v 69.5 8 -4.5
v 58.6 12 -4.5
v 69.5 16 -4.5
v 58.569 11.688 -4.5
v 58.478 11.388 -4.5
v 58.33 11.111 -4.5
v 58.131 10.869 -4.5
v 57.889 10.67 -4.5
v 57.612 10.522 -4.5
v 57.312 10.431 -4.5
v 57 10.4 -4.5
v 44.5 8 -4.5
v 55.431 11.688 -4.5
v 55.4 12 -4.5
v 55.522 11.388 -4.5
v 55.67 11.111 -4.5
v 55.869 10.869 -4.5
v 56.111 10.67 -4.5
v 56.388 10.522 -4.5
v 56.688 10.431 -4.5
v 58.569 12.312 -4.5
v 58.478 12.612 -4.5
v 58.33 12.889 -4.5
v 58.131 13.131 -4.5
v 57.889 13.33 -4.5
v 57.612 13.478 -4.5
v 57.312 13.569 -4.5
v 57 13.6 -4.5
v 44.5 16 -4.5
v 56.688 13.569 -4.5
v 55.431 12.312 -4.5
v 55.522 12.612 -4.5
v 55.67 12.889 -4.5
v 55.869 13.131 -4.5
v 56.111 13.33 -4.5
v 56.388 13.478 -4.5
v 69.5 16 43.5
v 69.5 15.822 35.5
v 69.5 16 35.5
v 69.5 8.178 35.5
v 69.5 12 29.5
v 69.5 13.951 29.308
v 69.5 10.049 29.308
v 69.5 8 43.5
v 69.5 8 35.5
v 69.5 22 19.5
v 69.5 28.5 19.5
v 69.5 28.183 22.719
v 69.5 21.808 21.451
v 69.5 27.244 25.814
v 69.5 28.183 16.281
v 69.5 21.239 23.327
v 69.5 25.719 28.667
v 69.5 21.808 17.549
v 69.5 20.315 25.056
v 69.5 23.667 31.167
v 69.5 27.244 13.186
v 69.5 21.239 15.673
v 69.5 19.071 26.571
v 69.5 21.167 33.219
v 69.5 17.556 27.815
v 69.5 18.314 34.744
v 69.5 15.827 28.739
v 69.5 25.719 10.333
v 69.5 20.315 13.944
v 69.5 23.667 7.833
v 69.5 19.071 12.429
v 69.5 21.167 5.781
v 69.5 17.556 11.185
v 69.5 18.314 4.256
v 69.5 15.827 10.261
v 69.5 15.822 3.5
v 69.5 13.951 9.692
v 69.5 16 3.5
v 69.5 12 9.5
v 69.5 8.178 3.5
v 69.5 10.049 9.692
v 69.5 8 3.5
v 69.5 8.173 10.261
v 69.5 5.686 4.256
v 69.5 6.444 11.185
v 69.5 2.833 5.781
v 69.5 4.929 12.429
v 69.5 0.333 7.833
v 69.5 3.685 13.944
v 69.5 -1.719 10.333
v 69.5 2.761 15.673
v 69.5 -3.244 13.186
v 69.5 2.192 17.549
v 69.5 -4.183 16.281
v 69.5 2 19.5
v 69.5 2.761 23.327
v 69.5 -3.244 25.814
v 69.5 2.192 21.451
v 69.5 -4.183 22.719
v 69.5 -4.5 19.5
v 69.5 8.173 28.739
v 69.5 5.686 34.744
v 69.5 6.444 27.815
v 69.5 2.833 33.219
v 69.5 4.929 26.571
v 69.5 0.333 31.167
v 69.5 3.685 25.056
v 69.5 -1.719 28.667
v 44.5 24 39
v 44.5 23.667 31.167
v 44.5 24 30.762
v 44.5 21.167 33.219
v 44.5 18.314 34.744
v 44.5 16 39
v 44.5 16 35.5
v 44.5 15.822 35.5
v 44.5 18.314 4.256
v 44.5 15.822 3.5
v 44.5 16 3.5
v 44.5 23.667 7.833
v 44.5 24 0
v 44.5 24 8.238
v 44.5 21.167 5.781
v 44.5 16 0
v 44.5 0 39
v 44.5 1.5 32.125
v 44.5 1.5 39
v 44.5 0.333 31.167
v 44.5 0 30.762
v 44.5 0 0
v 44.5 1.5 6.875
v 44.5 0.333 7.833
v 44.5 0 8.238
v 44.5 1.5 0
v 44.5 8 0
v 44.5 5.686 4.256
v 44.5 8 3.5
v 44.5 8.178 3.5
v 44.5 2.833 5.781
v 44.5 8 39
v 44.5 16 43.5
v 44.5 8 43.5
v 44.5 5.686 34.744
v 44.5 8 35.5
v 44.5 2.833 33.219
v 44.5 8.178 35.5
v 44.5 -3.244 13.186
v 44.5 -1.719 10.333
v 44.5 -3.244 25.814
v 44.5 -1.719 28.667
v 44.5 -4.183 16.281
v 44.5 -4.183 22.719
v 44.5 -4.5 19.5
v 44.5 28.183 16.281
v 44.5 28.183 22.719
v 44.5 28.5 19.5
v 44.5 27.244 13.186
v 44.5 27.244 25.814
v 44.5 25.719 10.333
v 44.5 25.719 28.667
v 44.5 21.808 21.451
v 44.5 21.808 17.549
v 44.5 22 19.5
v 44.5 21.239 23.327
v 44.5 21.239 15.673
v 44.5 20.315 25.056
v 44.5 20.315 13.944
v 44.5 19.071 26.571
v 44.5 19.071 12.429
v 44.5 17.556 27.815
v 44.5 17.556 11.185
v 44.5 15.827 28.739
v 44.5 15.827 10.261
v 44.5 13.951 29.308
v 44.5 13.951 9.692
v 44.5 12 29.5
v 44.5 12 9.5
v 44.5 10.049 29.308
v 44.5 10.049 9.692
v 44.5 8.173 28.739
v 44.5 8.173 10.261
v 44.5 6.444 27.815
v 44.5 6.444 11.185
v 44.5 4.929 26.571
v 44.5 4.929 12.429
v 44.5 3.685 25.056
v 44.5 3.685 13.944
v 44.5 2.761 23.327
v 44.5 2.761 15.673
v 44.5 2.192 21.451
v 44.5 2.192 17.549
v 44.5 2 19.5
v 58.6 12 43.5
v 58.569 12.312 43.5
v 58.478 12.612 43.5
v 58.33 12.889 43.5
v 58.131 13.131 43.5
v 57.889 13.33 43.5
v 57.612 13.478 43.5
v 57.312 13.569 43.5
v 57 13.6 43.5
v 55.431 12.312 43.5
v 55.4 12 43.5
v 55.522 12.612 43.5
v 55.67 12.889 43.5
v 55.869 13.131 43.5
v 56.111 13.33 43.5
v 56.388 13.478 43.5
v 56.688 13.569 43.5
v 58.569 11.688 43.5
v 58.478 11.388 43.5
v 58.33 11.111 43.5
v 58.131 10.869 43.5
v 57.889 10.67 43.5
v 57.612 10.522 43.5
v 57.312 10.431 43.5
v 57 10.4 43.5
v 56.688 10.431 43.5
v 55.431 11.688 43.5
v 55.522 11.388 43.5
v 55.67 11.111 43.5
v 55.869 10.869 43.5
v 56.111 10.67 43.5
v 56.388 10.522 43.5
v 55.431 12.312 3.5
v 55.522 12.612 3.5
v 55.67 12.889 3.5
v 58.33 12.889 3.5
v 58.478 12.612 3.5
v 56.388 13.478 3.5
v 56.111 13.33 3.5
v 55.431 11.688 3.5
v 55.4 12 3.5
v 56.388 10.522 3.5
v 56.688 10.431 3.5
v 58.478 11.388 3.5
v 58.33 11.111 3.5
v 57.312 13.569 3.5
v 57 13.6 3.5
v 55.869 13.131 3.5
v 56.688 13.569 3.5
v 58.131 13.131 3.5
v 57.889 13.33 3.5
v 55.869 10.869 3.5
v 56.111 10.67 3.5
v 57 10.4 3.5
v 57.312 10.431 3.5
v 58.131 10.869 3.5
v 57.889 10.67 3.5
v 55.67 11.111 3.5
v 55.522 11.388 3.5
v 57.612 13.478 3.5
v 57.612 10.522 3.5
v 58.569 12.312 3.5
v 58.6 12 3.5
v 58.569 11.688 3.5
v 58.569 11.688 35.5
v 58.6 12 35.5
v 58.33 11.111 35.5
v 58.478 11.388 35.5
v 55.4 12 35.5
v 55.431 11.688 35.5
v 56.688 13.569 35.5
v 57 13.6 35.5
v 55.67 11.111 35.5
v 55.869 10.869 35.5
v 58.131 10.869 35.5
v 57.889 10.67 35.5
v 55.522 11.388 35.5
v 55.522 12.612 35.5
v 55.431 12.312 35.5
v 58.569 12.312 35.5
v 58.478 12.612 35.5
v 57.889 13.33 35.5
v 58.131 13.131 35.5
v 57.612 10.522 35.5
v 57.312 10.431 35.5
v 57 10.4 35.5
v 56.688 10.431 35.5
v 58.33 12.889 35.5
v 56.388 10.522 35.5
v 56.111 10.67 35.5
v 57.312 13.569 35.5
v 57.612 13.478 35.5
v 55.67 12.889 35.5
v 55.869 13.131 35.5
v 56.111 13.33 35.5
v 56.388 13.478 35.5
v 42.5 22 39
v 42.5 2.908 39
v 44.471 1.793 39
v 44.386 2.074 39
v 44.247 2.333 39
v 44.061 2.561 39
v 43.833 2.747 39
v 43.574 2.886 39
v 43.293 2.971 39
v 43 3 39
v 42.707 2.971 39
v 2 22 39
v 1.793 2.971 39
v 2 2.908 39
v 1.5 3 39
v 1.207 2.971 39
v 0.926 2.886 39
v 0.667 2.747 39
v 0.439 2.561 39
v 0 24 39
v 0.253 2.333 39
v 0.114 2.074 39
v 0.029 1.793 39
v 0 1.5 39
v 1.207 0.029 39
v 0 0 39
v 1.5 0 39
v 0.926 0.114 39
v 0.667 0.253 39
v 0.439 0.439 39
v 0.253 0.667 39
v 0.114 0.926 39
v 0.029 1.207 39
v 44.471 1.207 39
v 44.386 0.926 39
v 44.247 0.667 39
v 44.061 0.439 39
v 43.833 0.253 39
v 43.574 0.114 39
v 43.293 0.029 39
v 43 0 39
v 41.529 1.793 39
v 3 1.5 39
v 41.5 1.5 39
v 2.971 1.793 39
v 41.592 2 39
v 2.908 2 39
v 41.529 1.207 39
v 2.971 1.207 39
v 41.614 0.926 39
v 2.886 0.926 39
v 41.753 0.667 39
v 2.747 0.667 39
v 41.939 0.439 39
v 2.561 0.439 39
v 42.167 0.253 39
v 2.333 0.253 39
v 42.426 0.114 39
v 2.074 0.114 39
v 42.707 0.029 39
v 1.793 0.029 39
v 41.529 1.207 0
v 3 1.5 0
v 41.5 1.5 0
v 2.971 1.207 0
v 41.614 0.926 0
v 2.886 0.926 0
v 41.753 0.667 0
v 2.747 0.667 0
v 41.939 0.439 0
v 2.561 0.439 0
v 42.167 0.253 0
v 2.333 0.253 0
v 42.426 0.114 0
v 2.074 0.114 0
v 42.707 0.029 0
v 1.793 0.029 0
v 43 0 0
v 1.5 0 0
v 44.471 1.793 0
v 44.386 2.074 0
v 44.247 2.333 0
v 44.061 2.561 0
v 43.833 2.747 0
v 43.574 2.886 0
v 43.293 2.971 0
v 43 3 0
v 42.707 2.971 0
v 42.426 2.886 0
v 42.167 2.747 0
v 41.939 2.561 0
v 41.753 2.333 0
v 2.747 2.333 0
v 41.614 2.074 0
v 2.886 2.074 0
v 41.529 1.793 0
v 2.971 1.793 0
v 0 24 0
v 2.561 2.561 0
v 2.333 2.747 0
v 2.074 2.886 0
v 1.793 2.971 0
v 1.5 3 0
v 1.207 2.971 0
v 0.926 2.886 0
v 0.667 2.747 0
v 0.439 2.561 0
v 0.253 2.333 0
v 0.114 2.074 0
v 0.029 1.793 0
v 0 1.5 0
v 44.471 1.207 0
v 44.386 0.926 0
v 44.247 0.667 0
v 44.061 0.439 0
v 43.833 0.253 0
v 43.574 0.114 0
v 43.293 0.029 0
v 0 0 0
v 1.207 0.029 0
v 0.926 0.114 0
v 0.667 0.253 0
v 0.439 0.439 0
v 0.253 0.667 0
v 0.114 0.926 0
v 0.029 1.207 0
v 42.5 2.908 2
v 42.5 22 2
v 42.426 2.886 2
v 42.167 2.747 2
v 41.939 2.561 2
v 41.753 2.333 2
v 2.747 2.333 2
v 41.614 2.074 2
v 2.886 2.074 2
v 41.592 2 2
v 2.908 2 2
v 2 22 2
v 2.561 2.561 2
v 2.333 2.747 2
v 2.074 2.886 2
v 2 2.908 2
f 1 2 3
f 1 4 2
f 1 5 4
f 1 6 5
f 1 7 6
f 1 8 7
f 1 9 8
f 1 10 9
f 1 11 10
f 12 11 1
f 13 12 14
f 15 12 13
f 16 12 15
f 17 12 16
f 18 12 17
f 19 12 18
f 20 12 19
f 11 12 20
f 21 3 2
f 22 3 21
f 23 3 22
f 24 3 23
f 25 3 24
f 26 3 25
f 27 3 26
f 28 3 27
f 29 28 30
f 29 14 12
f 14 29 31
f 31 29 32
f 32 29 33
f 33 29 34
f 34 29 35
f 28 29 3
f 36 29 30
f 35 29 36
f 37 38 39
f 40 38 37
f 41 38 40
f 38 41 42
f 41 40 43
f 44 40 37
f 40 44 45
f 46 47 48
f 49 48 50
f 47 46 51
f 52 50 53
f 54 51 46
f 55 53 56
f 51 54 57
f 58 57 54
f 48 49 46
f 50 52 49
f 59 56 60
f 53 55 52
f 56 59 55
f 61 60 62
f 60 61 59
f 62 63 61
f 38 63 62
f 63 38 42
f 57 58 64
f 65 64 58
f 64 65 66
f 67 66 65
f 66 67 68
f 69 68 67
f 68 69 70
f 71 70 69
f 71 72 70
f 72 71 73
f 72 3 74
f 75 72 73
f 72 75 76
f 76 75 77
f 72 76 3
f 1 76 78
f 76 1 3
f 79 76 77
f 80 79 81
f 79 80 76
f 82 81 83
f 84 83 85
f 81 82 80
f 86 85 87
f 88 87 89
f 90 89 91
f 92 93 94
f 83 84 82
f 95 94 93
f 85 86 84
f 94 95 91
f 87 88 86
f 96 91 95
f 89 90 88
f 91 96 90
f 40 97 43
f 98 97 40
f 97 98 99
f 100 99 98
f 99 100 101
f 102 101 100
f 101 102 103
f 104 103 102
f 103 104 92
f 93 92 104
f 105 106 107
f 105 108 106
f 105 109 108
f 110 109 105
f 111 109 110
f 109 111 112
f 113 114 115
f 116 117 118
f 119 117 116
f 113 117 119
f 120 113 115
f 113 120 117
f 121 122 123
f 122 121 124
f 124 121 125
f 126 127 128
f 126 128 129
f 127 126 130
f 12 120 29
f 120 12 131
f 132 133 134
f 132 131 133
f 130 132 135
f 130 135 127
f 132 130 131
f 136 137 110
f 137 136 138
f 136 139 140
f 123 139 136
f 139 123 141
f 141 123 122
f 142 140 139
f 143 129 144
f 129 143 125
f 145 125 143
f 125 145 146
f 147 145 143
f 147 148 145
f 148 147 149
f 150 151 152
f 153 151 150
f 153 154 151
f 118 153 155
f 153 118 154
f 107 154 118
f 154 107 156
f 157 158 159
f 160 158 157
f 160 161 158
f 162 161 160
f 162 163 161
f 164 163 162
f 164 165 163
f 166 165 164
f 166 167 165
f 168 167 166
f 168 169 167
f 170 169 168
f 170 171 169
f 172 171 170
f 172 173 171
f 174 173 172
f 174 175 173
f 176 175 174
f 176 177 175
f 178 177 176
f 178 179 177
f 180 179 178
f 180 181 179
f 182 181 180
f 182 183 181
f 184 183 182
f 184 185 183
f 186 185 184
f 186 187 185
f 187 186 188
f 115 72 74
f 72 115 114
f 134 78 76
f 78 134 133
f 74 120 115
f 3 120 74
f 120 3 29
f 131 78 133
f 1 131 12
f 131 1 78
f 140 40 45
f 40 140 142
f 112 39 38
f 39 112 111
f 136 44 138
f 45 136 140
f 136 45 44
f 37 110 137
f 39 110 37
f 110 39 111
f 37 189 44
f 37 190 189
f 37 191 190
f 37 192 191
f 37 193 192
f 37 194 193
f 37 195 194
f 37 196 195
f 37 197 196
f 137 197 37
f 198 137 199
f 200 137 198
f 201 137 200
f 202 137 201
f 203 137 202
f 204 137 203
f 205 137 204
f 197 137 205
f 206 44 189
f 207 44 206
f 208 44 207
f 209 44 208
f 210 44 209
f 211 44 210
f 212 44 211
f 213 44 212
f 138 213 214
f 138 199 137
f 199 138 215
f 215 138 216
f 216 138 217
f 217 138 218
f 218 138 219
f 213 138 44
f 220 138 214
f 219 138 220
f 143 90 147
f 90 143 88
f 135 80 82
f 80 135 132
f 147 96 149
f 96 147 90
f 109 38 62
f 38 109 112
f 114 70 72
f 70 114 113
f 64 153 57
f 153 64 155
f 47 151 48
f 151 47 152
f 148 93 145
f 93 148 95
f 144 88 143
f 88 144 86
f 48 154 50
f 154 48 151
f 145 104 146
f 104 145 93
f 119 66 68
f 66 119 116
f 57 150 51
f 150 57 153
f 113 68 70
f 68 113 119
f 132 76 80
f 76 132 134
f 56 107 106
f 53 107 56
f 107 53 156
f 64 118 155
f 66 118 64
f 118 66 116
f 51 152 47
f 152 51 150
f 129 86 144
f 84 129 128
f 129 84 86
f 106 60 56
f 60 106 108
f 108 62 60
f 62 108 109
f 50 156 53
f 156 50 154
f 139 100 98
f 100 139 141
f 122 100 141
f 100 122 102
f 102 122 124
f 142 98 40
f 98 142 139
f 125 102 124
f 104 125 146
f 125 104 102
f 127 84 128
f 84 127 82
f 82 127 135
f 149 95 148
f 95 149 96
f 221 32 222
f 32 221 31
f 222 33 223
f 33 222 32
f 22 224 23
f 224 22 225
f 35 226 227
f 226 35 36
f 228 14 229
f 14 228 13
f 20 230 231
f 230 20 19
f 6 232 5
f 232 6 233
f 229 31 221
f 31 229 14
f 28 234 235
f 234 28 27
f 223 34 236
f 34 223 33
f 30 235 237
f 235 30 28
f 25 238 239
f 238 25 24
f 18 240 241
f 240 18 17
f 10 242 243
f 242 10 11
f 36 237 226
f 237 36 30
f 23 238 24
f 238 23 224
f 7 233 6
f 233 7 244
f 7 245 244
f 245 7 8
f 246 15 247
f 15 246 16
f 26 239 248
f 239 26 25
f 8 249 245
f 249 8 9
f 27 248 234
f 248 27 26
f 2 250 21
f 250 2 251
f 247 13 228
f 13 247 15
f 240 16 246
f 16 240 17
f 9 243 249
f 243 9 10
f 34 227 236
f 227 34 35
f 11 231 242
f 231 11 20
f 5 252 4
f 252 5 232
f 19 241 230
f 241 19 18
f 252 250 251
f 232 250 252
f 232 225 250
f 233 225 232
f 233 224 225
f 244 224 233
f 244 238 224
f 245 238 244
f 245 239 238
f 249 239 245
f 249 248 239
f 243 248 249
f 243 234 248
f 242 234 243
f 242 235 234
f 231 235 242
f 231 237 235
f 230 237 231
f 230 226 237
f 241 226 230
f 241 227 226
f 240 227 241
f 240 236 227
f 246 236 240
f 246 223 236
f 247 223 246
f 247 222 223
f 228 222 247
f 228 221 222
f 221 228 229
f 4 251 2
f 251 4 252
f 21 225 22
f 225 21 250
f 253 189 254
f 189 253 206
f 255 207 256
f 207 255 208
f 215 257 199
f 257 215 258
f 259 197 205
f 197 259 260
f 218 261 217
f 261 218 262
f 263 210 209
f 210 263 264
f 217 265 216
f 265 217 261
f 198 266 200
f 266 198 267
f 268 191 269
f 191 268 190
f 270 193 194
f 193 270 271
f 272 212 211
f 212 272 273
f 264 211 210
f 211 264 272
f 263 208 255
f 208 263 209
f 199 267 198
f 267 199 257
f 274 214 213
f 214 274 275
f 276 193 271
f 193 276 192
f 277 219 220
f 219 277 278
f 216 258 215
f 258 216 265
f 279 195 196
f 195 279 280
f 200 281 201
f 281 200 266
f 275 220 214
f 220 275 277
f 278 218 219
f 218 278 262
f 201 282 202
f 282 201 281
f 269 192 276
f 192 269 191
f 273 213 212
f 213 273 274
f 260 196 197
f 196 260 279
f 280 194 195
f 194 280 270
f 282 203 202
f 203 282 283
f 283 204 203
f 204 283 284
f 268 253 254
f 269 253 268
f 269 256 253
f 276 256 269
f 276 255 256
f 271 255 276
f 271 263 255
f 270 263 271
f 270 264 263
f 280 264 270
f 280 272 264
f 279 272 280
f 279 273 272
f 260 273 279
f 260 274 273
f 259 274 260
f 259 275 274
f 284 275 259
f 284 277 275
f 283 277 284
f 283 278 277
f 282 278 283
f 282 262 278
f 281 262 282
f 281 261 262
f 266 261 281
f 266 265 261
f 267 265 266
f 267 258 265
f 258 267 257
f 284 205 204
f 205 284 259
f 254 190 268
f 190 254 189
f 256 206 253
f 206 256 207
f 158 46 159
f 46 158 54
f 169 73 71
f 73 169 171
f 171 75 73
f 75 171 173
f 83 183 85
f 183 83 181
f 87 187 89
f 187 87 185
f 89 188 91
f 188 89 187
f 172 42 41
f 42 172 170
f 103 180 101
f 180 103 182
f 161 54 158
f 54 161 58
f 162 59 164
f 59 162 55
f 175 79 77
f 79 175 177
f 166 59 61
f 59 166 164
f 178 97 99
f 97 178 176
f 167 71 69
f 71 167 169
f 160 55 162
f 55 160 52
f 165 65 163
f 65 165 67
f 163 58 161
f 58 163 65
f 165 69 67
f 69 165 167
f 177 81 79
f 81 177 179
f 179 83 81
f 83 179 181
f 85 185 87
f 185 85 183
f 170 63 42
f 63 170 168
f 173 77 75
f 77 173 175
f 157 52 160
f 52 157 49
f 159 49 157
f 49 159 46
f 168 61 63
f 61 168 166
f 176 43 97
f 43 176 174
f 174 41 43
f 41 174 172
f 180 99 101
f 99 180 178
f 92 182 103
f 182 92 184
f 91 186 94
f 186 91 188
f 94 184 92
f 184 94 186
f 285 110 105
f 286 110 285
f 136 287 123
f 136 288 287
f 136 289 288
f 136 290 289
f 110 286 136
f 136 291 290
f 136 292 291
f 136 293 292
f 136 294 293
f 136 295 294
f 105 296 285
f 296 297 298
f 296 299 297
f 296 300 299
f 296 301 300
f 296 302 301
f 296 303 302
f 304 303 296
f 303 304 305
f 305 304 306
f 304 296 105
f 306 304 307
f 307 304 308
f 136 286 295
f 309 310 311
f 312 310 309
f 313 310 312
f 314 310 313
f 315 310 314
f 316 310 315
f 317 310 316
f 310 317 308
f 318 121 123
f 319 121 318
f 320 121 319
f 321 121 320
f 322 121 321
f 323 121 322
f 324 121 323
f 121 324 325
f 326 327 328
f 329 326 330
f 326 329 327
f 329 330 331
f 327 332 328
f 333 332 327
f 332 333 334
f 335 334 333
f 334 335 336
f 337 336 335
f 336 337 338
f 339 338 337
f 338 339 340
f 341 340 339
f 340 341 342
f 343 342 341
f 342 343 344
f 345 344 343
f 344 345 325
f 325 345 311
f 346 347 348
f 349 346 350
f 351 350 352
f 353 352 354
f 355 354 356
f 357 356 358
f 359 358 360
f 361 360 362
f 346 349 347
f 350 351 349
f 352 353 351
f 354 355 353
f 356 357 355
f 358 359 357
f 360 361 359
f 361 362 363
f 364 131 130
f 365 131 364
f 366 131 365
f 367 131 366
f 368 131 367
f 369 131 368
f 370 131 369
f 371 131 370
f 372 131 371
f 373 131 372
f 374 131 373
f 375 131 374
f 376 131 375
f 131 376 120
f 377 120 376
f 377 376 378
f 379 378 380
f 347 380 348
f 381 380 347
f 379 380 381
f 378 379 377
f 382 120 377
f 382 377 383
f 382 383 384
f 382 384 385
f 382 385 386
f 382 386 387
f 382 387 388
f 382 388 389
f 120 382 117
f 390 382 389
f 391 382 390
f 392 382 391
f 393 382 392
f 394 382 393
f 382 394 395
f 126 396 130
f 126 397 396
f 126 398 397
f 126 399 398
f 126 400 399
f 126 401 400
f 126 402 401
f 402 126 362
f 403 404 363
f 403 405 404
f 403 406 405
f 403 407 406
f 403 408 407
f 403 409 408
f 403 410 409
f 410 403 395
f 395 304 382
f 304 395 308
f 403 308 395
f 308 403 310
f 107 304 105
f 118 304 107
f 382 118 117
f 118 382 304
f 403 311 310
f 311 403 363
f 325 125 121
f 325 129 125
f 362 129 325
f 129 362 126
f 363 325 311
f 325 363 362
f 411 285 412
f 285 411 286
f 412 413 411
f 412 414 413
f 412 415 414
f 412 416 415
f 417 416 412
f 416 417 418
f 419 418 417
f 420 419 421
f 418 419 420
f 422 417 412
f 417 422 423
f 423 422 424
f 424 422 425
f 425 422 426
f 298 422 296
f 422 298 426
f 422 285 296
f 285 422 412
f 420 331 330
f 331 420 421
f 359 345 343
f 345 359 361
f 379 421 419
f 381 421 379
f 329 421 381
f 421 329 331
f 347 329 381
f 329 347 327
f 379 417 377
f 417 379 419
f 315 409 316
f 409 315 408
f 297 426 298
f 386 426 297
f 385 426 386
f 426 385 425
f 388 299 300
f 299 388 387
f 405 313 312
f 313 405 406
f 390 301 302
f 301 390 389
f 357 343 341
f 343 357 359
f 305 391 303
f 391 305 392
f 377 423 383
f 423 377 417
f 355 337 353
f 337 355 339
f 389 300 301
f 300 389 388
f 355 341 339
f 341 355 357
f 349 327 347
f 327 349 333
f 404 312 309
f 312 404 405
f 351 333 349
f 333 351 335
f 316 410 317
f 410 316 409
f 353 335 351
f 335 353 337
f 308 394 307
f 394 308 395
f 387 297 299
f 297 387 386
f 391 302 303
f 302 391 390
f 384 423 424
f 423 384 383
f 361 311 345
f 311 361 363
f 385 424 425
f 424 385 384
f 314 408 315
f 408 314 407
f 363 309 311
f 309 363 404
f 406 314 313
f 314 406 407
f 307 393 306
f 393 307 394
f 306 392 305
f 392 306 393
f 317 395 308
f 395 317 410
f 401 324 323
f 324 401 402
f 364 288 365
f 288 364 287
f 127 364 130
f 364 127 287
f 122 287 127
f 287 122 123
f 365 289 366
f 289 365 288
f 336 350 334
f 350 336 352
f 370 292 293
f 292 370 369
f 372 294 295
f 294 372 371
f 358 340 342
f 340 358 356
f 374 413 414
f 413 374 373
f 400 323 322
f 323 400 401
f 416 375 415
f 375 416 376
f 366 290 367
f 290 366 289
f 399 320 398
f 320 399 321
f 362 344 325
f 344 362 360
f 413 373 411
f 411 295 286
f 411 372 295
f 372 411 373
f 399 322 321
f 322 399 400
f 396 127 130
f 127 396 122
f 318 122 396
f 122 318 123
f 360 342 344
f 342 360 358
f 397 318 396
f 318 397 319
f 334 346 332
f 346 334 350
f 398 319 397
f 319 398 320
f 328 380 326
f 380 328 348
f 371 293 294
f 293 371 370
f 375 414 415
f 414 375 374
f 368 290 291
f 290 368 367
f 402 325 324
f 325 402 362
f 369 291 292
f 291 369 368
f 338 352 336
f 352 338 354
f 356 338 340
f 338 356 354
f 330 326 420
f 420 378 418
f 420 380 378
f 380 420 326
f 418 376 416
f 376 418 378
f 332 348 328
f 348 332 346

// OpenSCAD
// ============================================================
// shoulder_joint_bracket.scad
// Shoulder Joint Bracket for Humanoid Welcoming Robot
// Servo mount interface for MG996R servo + PVC pipe adapter
//
// Print Settings:
//   Material:    PLA
//   Infill:      80%
//   Layer height: 0.2 mm
//   Supports:    None required
//   Weight:      ~20 g
//   Print time:  ~8 minutes
// ============================================================

$fn = 32;
$fa = 6;
$fs = 1;

// --- Parametric Variables ---
servo_width            = 40.5; // mm  MG996R body width
servo_depth            = 20;   // mm  MG996R body depth
servo_height           = 37;   // mm  MG996R body height
servo_flange_thickness = 2.5;  // mm  mounting flange thickness
pvc_bore               = 20;   // mm  PVC pipe inner diameter
pvc_wall               = 2.5;  // mm  PVC pipe wall thickness (OD ~25 mm)
mounting_hole_diameter = 3.2;  // mm  M3 screw holes
wall_thickness         = 2.0;  // mm  bracket wall thickness
corner_radius          = 1.5;  // mm  reinforced bearing surface radius

// Derived
pvc_od = pvc_bore + 2 * pvc_wall;            // outer diameter ~25 mm
servo_mount_length = servo_width + 2 * wall_thickness;
servo_mount_width  = servo_depth + 2 * wall_thickness;
servo_mount_height = servo_height + wall_thickness;

// Horn mounting hole positions (4-point, 8 mm from servo centre)
horn_hole_offset = 8;

// ============================================================
// Module: servo_pocket
// Recessed cavity for MG996R servo body
// ============================================================
module servo_pocket() {
    translate([wall_thickness, wall_thickness, wall_thickness])
        cube([servo_width, servo_depth, servo_height + 1]);
}

// ============================================================
// Module: servo_horn_holes
// 4-point servo horn mounting holes on top face
// ============================================================
module servo_horn_holes() {
    cx = servo_mount_length / 2;
    cy = servo_mount_width  / 2;
    z  = servo_mount_height - 0.1;
    for (dx = [-horn_hole_offset, horn_hole_offset])
        for (dy = [-horn_hole_offset, horn_hole_offset])
            translate([cx + dx, cy + dy, z])
                cylinder(d = mounting_hole_diameter, h = wall_thickness + 0.2);
}

// ============================================================
// Module: pvc_adapter
// Cylindrical PVC adapter collar with screw-mount tabs
// ============================================================
module pvc_adapter() {
    adapter_height = 25;
    collar_od      = pvc_od + 2 * wall_thickness * 2; // thick collar
    tab_width      = 8;
    tab_thickness  = wall_thickness;

    difference() {
        union() {
            // Main collar
            cylinder(d = collar_od, h = adapter_height);
            // Side mounting tabs
            for (a = [0, 180])
                rotate([0, 0, a])
                    translate([collar_od / 2 - 0.5, -tab_width / 2, 0])
                        cube([tab_width, tab_width, adapter_height]);
        }
        // PVC bore through entire height
        translate([0, 0, -0.1])
            cylinder(d = pvc_bore, h = adapter_height + 0.2);
        // Screw holes in tabs
        for (a = [0, 180])
            rotate([0, 0, a])
                translate([collar_od / 2 + tab_width / 2, 0, adapter_height / 2])
                    rotate([0, 90, 0])
                        cylinder(d = mounting_hole_diameter, h = tab_width + 1,
                                 center = true);
    }
}

// ============================================================
// Module: shoulder_joint_bracket
// Main bracket body
// ============================================================
module shoulder_joint_bracket() {
    difference() {
        union() {
            // Servo mount block
            cube([servo_mount_length, servo_mount_width, servo_mount_height]);
            // PVC adapter – positioned on the side face
            translate([servo_mount_length, servo_mount_width / 2,
                       servo_mount_height / 2])
                rotate([0, 90, 0])
                    pvc_adapter();
        }
        // Remove servo cavity
        servo_pocket();
        // Remove servo horn mounting holes
        servo_horn_holes();
        // Round inside corners for bearing surface
        translate([corner_radius, corner_radius, -0.1])
            cylinder(r = corner_radius, h = servo_mount_height + 0.2);
        translate([servo_mount_length - corner_radius, corner_radius, -0.1])
            cylinder(r = corner_radius, h = servo_mount_height + 0.2);
    }
}

// ============================================================
// Render
// ============================================================
color("SteelBlue")
    shoulder_joint_bracket();
